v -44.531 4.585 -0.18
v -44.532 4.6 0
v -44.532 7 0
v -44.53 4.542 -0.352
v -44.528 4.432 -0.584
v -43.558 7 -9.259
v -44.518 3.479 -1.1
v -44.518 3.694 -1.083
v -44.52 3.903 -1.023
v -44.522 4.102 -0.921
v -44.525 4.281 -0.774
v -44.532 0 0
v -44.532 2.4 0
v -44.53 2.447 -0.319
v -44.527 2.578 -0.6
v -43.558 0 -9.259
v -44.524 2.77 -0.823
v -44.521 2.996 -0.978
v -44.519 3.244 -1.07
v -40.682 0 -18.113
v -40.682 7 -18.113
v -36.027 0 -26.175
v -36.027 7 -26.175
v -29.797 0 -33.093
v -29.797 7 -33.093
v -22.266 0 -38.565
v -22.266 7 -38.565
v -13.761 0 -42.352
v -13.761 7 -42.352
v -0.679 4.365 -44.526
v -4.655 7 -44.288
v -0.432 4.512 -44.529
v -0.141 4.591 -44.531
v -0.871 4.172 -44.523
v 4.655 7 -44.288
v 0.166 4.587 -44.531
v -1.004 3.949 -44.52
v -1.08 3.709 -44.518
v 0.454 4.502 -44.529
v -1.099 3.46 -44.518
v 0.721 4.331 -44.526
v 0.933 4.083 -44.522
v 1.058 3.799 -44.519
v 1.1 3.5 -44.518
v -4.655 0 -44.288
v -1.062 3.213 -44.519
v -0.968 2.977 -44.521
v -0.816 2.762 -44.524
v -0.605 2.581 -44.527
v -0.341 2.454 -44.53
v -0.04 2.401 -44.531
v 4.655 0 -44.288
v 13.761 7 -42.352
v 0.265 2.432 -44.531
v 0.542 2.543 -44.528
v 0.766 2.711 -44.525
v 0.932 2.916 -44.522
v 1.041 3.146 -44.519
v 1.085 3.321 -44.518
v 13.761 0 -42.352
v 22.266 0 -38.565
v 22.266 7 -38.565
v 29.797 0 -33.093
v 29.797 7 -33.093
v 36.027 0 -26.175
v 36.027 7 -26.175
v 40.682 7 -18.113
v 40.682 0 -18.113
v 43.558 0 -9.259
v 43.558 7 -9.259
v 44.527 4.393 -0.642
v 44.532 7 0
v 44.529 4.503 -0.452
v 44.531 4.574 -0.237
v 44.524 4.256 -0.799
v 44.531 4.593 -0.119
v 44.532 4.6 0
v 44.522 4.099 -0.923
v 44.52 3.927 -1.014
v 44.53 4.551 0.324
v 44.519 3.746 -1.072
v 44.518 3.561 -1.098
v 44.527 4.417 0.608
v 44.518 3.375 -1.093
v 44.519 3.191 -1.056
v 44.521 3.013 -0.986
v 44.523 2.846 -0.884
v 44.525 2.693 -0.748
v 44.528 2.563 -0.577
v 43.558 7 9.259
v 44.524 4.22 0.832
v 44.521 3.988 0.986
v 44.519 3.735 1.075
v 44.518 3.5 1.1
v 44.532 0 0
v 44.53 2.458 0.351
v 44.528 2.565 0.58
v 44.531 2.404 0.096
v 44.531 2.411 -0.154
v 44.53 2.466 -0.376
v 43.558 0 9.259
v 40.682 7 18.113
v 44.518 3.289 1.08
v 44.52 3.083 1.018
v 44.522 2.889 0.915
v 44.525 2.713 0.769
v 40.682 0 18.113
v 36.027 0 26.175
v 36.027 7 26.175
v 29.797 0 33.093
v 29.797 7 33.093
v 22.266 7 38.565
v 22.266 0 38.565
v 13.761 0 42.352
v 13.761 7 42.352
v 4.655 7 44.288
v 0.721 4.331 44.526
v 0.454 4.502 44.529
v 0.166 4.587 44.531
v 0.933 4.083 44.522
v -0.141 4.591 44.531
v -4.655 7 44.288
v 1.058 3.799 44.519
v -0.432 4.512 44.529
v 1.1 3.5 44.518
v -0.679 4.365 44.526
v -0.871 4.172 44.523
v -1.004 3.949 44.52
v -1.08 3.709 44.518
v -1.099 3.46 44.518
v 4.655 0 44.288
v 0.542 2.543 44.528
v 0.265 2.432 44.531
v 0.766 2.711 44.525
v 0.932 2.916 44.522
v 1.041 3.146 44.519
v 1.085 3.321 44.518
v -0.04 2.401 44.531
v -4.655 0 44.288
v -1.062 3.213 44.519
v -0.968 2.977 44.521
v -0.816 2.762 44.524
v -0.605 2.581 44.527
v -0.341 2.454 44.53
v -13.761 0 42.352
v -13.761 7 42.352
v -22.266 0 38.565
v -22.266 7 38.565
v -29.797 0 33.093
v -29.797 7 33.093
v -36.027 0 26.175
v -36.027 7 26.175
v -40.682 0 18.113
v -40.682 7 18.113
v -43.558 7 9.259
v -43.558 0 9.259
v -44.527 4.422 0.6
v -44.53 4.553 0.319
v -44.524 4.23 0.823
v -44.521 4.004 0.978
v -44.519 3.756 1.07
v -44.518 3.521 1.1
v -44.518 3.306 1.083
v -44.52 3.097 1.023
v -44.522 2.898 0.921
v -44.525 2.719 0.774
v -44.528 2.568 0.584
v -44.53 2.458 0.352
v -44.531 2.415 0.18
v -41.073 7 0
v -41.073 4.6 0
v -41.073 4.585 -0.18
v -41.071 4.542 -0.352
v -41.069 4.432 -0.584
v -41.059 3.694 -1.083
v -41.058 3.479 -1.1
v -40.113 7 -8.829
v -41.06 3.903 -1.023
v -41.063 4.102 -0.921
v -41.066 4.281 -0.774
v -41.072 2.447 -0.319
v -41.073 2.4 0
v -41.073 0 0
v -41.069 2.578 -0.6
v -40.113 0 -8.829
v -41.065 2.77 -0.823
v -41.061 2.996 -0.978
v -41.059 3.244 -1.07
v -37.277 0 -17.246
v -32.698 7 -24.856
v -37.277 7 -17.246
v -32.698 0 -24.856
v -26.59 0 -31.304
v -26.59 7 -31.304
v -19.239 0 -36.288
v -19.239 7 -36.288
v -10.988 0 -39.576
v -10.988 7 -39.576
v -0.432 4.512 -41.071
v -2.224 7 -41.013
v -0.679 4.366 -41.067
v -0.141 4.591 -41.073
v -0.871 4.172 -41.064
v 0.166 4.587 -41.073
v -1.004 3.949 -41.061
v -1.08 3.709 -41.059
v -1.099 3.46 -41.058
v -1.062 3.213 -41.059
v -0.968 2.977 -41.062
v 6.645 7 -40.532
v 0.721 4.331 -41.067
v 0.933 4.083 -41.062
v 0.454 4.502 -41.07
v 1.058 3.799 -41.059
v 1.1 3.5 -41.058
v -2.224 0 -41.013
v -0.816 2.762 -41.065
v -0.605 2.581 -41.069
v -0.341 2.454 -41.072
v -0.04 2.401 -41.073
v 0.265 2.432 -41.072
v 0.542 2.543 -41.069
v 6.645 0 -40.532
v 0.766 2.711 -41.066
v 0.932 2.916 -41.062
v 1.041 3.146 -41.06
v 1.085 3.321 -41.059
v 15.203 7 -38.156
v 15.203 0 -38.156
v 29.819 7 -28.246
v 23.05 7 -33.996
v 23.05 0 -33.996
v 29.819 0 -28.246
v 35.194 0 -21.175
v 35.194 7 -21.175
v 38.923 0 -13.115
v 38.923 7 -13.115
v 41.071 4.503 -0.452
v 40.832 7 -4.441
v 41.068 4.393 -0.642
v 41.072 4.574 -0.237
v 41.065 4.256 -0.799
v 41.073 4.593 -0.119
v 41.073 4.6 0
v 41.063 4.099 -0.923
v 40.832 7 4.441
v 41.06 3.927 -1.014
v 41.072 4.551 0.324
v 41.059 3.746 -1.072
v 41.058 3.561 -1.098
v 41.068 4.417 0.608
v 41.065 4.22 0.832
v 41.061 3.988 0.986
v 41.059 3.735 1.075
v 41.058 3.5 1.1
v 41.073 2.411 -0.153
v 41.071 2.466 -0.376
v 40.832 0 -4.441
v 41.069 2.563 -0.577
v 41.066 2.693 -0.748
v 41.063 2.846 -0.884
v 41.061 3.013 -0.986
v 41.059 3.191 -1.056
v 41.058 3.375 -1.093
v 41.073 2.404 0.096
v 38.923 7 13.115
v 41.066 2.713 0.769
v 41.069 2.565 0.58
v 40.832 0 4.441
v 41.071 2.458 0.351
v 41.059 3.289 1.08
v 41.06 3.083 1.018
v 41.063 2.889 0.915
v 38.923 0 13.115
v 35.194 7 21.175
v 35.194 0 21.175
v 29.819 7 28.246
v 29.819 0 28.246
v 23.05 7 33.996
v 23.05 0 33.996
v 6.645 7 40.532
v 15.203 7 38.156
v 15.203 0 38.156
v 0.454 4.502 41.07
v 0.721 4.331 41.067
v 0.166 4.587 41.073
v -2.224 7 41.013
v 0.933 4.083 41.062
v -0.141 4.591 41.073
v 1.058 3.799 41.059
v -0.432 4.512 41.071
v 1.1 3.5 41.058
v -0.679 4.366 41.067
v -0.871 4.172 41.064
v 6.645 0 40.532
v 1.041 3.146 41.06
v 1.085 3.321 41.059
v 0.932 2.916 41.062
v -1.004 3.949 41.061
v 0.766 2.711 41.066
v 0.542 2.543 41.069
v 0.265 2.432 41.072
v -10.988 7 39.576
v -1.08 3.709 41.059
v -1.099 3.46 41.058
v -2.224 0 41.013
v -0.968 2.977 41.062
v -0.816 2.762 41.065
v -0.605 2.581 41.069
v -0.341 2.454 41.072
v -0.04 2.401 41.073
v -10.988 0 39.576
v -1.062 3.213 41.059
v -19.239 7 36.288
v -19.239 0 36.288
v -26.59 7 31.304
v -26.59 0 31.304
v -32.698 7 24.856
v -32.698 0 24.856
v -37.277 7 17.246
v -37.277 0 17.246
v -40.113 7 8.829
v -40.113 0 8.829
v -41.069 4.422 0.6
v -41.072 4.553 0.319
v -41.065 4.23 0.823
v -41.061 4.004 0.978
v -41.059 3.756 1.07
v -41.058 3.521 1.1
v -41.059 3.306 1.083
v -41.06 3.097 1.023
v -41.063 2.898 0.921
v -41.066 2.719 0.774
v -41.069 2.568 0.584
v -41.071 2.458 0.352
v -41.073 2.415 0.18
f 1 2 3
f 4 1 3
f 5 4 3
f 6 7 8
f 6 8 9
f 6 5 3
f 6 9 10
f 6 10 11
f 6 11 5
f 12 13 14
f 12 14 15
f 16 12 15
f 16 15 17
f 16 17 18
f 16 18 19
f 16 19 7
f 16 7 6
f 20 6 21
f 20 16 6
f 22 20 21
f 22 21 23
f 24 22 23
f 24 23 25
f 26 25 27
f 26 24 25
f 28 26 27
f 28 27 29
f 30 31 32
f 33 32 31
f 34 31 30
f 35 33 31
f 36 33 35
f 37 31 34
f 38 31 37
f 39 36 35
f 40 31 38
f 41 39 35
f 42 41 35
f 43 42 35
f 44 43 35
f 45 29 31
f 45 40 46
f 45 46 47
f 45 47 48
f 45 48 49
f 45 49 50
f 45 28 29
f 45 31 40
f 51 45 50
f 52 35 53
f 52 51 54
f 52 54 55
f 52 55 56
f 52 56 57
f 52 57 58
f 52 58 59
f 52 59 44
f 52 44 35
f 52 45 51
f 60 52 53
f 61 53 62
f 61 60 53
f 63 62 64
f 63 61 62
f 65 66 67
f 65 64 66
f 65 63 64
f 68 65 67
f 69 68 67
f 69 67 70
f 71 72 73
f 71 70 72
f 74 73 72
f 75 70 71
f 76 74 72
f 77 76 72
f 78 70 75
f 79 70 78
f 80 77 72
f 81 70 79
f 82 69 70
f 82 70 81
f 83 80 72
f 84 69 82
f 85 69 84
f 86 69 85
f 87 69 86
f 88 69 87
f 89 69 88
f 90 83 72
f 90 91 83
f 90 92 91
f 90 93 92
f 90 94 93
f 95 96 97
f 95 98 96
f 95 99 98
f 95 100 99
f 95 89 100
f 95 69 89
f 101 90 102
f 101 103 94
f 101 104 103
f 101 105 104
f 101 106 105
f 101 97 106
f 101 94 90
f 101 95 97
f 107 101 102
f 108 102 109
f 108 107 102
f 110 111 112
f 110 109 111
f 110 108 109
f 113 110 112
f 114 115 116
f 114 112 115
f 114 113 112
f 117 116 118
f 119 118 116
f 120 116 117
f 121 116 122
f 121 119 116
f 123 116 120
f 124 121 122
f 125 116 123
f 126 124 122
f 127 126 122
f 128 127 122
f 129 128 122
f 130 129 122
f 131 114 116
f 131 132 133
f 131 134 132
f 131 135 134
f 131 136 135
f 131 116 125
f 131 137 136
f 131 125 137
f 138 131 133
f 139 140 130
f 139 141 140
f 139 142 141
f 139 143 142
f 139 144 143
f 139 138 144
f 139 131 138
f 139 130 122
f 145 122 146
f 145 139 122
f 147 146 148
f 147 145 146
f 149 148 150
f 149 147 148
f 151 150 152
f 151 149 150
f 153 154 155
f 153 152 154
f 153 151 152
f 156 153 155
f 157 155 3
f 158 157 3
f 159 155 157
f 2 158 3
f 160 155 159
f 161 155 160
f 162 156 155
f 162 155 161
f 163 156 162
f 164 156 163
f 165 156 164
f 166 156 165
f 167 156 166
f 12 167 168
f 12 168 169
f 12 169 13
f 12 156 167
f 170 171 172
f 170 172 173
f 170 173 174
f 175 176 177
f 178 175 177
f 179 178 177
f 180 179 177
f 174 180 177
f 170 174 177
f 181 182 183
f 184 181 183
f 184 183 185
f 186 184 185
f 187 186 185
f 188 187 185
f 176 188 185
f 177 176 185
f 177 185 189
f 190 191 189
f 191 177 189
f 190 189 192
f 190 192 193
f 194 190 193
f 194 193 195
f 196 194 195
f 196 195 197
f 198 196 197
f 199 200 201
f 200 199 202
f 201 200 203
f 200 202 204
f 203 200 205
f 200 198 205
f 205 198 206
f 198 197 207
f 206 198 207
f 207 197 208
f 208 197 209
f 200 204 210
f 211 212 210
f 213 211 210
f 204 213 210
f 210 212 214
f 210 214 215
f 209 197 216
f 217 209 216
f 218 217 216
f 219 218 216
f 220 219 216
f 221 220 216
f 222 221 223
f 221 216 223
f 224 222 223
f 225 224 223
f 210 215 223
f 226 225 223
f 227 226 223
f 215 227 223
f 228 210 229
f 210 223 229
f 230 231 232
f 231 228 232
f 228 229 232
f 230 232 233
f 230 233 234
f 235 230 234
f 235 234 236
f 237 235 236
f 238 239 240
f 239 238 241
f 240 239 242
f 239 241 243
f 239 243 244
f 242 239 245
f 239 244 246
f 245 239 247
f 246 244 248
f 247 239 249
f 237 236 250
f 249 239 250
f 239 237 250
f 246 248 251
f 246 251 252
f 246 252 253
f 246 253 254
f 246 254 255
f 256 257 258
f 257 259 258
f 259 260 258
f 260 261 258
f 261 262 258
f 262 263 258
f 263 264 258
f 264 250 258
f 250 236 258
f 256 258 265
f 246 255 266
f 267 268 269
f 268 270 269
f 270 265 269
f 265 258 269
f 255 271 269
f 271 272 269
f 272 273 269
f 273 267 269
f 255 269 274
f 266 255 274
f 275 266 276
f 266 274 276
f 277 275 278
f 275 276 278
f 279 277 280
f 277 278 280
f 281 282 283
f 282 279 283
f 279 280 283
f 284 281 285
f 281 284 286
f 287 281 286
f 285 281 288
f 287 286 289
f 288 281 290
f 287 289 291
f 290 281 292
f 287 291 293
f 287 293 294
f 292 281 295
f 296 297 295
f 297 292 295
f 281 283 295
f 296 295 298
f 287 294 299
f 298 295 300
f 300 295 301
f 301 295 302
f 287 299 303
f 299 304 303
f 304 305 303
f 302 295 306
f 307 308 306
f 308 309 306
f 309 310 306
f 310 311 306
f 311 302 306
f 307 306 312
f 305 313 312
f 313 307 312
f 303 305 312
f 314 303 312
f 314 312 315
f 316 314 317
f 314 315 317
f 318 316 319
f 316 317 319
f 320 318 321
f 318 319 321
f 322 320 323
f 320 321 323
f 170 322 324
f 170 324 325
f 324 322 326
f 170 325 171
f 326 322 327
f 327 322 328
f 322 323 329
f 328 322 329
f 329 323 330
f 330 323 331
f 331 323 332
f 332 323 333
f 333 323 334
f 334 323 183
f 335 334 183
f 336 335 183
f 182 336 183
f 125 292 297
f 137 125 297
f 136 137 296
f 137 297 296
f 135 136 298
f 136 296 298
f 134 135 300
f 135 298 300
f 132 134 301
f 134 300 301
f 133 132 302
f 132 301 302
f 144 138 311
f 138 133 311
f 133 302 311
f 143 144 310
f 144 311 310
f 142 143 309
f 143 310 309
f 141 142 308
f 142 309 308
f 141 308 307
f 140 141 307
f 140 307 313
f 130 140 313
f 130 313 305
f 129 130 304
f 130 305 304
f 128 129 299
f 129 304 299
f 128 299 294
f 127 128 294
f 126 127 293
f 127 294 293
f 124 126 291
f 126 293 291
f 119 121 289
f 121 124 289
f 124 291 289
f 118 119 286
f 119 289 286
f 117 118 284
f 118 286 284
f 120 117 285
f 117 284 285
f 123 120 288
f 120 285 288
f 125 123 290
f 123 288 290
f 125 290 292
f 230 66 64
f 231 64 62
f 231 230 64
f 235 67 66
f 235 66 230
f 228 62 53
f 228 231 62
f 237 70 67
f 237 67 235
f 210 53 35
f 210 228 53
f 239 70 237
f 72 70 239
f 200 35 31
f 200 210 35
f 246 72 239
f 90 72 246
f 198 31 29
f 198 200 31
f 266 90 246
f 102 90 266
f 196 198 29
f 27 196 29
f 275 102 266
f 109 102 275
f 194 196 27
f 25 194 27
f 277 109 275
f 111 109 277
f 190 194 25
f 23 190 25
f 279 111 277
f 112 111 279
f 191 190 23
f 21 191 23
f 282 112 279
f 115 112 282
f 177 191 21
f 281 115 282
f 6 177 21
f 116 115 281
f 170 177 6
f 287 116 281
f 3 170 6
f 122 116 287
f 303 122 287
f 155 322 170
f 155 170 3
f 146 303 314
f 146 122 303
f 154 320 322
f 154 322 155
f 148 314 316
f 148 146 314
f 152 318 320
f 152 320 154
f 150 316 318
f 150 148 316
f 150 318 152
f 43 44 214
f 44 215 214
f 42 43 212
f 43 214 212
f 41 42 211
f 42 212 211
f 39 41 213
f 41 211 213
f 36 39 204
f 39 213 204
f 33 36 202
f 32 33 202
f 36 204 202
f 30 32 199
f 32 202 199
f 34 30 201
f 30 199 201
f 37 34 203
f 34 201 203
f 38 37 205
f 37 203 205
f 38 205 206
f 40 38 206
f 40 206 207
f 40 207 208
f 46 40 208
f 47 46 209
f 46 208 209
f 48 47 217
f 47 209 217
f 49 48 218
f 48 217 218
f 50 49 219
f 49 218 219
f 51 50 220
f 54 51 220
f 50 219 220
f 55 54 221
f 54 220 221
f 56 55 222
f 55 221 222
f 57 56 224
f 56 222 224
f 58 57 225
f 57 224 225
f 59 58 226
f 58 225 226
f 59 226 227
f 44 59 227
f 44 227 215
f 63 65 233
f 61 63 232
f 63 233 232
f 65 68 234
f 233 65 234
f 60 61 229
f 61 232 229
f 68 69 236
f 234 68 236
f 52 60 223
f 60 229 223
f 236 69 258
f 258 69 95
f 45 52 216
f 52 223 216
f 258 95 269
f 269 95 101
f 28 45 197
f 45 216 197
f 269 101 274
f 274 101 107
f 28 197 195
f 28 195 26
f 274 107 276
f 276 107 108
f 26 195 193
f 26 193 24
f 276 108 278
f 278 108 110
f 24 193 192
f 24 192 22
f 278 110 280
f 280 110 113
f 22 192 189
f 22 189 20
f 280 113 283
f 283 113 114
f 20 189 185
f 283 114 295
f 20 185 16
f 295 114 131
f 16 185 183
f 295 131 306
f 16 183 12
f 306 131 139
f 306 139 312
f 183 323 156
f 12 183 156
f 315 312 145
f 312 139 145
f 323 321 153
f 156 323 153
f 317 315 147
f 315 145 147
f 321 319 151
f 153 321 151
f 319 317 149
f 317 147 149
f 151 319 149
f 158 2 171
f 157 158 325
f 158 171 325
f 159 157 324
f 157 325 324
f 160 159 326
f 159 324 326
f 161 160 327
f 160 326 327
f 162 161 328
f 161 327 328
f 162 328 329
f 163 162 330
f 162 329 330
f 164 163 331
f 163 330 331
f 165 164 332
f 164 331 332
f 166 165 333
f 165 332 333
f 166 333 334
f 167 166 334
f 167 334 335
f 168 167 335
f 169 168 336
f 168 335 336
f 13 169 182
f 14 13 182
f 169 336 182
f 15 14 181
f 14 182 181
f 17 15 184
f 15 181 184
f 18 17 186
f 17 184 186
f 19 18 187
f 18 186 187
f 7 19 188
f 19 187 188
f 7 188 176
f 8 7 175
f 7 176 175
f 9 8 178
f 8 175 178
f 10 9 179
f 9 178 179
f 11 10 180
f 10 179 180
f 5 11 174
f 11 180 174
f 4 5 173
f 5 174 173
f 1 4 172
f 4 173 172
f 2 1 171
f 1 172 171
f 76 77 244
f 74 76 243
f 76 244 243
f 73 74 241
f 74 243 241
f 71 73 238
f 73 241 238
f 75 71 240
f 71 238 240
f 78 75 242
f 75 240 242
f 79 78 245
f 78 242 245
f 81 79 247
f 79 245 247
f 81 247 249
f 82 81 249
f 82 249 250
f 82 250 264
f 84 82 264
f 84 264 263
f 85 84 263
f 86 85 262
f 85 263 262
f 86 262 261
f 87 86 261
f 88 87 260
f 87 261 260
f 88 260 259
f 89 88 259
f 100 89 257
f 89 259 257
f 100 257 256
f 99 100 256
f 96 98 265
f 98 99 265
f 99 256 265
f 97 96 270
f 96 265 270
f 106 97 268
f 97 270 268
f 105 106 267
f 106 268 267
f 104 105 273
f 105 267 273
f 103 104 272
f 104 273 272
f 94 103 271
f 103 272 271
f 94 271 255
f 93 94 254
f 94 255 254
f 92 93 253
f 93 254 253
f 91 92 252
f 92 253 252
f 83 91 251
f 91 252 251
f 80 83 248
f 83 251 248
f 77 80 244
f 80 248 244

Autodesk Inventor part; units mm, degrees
ref_plane "YZ Plane" through (0, 0, 0) normal (1, 0, 0) x (0, 1, 0)
ref_plane "XZ Plane" through (0, 0, 0) normal (0, 1, 0) x (-1, 0, 0)
ref_plane "XY Plane" through (0, 0, 0) normal (0, 0, 1) x (1, 0, 0)
sketch "Sketch1" plane through (0, 0, 0) normal (0, 1, 0) x (-1, 0, 0)
  circle A0 centre (0, 0) radius 41.073
  circle A1 centre (0, 0) radius 44.5315
  dimension "d0" = 82.146
  dimension "d1" = 89.063
extrude "Extrusion1" add sketch "Sketch1" along normal blind 7
sketch "Sketch3" plane through (0, 0, 0) normal (0, 0, 1) x (1, 0, 0)
  circle A0 centre (0, 3.5) radius 1.1
  point P0 (0, 0)
  dimension "d4" = 2.2
extrude "Extrusion2" cut sketch "Sketch3" along normal blind 57 and the other way blind 58.5
sketch "Sketch4" plane through (0, 0, 0) normal (1, 0, 0) x (0, 1, 0)
  circle A0 centre (3.5, 0) radius 1.1
  point P0 (0, 0)
  dimension "d9" = 2.2
extrude "Extrusion3" cut sketch "Sketch4" along normal blind 57 and the other way blind 58.5
properties part number "Sensing Gripper Crown"
